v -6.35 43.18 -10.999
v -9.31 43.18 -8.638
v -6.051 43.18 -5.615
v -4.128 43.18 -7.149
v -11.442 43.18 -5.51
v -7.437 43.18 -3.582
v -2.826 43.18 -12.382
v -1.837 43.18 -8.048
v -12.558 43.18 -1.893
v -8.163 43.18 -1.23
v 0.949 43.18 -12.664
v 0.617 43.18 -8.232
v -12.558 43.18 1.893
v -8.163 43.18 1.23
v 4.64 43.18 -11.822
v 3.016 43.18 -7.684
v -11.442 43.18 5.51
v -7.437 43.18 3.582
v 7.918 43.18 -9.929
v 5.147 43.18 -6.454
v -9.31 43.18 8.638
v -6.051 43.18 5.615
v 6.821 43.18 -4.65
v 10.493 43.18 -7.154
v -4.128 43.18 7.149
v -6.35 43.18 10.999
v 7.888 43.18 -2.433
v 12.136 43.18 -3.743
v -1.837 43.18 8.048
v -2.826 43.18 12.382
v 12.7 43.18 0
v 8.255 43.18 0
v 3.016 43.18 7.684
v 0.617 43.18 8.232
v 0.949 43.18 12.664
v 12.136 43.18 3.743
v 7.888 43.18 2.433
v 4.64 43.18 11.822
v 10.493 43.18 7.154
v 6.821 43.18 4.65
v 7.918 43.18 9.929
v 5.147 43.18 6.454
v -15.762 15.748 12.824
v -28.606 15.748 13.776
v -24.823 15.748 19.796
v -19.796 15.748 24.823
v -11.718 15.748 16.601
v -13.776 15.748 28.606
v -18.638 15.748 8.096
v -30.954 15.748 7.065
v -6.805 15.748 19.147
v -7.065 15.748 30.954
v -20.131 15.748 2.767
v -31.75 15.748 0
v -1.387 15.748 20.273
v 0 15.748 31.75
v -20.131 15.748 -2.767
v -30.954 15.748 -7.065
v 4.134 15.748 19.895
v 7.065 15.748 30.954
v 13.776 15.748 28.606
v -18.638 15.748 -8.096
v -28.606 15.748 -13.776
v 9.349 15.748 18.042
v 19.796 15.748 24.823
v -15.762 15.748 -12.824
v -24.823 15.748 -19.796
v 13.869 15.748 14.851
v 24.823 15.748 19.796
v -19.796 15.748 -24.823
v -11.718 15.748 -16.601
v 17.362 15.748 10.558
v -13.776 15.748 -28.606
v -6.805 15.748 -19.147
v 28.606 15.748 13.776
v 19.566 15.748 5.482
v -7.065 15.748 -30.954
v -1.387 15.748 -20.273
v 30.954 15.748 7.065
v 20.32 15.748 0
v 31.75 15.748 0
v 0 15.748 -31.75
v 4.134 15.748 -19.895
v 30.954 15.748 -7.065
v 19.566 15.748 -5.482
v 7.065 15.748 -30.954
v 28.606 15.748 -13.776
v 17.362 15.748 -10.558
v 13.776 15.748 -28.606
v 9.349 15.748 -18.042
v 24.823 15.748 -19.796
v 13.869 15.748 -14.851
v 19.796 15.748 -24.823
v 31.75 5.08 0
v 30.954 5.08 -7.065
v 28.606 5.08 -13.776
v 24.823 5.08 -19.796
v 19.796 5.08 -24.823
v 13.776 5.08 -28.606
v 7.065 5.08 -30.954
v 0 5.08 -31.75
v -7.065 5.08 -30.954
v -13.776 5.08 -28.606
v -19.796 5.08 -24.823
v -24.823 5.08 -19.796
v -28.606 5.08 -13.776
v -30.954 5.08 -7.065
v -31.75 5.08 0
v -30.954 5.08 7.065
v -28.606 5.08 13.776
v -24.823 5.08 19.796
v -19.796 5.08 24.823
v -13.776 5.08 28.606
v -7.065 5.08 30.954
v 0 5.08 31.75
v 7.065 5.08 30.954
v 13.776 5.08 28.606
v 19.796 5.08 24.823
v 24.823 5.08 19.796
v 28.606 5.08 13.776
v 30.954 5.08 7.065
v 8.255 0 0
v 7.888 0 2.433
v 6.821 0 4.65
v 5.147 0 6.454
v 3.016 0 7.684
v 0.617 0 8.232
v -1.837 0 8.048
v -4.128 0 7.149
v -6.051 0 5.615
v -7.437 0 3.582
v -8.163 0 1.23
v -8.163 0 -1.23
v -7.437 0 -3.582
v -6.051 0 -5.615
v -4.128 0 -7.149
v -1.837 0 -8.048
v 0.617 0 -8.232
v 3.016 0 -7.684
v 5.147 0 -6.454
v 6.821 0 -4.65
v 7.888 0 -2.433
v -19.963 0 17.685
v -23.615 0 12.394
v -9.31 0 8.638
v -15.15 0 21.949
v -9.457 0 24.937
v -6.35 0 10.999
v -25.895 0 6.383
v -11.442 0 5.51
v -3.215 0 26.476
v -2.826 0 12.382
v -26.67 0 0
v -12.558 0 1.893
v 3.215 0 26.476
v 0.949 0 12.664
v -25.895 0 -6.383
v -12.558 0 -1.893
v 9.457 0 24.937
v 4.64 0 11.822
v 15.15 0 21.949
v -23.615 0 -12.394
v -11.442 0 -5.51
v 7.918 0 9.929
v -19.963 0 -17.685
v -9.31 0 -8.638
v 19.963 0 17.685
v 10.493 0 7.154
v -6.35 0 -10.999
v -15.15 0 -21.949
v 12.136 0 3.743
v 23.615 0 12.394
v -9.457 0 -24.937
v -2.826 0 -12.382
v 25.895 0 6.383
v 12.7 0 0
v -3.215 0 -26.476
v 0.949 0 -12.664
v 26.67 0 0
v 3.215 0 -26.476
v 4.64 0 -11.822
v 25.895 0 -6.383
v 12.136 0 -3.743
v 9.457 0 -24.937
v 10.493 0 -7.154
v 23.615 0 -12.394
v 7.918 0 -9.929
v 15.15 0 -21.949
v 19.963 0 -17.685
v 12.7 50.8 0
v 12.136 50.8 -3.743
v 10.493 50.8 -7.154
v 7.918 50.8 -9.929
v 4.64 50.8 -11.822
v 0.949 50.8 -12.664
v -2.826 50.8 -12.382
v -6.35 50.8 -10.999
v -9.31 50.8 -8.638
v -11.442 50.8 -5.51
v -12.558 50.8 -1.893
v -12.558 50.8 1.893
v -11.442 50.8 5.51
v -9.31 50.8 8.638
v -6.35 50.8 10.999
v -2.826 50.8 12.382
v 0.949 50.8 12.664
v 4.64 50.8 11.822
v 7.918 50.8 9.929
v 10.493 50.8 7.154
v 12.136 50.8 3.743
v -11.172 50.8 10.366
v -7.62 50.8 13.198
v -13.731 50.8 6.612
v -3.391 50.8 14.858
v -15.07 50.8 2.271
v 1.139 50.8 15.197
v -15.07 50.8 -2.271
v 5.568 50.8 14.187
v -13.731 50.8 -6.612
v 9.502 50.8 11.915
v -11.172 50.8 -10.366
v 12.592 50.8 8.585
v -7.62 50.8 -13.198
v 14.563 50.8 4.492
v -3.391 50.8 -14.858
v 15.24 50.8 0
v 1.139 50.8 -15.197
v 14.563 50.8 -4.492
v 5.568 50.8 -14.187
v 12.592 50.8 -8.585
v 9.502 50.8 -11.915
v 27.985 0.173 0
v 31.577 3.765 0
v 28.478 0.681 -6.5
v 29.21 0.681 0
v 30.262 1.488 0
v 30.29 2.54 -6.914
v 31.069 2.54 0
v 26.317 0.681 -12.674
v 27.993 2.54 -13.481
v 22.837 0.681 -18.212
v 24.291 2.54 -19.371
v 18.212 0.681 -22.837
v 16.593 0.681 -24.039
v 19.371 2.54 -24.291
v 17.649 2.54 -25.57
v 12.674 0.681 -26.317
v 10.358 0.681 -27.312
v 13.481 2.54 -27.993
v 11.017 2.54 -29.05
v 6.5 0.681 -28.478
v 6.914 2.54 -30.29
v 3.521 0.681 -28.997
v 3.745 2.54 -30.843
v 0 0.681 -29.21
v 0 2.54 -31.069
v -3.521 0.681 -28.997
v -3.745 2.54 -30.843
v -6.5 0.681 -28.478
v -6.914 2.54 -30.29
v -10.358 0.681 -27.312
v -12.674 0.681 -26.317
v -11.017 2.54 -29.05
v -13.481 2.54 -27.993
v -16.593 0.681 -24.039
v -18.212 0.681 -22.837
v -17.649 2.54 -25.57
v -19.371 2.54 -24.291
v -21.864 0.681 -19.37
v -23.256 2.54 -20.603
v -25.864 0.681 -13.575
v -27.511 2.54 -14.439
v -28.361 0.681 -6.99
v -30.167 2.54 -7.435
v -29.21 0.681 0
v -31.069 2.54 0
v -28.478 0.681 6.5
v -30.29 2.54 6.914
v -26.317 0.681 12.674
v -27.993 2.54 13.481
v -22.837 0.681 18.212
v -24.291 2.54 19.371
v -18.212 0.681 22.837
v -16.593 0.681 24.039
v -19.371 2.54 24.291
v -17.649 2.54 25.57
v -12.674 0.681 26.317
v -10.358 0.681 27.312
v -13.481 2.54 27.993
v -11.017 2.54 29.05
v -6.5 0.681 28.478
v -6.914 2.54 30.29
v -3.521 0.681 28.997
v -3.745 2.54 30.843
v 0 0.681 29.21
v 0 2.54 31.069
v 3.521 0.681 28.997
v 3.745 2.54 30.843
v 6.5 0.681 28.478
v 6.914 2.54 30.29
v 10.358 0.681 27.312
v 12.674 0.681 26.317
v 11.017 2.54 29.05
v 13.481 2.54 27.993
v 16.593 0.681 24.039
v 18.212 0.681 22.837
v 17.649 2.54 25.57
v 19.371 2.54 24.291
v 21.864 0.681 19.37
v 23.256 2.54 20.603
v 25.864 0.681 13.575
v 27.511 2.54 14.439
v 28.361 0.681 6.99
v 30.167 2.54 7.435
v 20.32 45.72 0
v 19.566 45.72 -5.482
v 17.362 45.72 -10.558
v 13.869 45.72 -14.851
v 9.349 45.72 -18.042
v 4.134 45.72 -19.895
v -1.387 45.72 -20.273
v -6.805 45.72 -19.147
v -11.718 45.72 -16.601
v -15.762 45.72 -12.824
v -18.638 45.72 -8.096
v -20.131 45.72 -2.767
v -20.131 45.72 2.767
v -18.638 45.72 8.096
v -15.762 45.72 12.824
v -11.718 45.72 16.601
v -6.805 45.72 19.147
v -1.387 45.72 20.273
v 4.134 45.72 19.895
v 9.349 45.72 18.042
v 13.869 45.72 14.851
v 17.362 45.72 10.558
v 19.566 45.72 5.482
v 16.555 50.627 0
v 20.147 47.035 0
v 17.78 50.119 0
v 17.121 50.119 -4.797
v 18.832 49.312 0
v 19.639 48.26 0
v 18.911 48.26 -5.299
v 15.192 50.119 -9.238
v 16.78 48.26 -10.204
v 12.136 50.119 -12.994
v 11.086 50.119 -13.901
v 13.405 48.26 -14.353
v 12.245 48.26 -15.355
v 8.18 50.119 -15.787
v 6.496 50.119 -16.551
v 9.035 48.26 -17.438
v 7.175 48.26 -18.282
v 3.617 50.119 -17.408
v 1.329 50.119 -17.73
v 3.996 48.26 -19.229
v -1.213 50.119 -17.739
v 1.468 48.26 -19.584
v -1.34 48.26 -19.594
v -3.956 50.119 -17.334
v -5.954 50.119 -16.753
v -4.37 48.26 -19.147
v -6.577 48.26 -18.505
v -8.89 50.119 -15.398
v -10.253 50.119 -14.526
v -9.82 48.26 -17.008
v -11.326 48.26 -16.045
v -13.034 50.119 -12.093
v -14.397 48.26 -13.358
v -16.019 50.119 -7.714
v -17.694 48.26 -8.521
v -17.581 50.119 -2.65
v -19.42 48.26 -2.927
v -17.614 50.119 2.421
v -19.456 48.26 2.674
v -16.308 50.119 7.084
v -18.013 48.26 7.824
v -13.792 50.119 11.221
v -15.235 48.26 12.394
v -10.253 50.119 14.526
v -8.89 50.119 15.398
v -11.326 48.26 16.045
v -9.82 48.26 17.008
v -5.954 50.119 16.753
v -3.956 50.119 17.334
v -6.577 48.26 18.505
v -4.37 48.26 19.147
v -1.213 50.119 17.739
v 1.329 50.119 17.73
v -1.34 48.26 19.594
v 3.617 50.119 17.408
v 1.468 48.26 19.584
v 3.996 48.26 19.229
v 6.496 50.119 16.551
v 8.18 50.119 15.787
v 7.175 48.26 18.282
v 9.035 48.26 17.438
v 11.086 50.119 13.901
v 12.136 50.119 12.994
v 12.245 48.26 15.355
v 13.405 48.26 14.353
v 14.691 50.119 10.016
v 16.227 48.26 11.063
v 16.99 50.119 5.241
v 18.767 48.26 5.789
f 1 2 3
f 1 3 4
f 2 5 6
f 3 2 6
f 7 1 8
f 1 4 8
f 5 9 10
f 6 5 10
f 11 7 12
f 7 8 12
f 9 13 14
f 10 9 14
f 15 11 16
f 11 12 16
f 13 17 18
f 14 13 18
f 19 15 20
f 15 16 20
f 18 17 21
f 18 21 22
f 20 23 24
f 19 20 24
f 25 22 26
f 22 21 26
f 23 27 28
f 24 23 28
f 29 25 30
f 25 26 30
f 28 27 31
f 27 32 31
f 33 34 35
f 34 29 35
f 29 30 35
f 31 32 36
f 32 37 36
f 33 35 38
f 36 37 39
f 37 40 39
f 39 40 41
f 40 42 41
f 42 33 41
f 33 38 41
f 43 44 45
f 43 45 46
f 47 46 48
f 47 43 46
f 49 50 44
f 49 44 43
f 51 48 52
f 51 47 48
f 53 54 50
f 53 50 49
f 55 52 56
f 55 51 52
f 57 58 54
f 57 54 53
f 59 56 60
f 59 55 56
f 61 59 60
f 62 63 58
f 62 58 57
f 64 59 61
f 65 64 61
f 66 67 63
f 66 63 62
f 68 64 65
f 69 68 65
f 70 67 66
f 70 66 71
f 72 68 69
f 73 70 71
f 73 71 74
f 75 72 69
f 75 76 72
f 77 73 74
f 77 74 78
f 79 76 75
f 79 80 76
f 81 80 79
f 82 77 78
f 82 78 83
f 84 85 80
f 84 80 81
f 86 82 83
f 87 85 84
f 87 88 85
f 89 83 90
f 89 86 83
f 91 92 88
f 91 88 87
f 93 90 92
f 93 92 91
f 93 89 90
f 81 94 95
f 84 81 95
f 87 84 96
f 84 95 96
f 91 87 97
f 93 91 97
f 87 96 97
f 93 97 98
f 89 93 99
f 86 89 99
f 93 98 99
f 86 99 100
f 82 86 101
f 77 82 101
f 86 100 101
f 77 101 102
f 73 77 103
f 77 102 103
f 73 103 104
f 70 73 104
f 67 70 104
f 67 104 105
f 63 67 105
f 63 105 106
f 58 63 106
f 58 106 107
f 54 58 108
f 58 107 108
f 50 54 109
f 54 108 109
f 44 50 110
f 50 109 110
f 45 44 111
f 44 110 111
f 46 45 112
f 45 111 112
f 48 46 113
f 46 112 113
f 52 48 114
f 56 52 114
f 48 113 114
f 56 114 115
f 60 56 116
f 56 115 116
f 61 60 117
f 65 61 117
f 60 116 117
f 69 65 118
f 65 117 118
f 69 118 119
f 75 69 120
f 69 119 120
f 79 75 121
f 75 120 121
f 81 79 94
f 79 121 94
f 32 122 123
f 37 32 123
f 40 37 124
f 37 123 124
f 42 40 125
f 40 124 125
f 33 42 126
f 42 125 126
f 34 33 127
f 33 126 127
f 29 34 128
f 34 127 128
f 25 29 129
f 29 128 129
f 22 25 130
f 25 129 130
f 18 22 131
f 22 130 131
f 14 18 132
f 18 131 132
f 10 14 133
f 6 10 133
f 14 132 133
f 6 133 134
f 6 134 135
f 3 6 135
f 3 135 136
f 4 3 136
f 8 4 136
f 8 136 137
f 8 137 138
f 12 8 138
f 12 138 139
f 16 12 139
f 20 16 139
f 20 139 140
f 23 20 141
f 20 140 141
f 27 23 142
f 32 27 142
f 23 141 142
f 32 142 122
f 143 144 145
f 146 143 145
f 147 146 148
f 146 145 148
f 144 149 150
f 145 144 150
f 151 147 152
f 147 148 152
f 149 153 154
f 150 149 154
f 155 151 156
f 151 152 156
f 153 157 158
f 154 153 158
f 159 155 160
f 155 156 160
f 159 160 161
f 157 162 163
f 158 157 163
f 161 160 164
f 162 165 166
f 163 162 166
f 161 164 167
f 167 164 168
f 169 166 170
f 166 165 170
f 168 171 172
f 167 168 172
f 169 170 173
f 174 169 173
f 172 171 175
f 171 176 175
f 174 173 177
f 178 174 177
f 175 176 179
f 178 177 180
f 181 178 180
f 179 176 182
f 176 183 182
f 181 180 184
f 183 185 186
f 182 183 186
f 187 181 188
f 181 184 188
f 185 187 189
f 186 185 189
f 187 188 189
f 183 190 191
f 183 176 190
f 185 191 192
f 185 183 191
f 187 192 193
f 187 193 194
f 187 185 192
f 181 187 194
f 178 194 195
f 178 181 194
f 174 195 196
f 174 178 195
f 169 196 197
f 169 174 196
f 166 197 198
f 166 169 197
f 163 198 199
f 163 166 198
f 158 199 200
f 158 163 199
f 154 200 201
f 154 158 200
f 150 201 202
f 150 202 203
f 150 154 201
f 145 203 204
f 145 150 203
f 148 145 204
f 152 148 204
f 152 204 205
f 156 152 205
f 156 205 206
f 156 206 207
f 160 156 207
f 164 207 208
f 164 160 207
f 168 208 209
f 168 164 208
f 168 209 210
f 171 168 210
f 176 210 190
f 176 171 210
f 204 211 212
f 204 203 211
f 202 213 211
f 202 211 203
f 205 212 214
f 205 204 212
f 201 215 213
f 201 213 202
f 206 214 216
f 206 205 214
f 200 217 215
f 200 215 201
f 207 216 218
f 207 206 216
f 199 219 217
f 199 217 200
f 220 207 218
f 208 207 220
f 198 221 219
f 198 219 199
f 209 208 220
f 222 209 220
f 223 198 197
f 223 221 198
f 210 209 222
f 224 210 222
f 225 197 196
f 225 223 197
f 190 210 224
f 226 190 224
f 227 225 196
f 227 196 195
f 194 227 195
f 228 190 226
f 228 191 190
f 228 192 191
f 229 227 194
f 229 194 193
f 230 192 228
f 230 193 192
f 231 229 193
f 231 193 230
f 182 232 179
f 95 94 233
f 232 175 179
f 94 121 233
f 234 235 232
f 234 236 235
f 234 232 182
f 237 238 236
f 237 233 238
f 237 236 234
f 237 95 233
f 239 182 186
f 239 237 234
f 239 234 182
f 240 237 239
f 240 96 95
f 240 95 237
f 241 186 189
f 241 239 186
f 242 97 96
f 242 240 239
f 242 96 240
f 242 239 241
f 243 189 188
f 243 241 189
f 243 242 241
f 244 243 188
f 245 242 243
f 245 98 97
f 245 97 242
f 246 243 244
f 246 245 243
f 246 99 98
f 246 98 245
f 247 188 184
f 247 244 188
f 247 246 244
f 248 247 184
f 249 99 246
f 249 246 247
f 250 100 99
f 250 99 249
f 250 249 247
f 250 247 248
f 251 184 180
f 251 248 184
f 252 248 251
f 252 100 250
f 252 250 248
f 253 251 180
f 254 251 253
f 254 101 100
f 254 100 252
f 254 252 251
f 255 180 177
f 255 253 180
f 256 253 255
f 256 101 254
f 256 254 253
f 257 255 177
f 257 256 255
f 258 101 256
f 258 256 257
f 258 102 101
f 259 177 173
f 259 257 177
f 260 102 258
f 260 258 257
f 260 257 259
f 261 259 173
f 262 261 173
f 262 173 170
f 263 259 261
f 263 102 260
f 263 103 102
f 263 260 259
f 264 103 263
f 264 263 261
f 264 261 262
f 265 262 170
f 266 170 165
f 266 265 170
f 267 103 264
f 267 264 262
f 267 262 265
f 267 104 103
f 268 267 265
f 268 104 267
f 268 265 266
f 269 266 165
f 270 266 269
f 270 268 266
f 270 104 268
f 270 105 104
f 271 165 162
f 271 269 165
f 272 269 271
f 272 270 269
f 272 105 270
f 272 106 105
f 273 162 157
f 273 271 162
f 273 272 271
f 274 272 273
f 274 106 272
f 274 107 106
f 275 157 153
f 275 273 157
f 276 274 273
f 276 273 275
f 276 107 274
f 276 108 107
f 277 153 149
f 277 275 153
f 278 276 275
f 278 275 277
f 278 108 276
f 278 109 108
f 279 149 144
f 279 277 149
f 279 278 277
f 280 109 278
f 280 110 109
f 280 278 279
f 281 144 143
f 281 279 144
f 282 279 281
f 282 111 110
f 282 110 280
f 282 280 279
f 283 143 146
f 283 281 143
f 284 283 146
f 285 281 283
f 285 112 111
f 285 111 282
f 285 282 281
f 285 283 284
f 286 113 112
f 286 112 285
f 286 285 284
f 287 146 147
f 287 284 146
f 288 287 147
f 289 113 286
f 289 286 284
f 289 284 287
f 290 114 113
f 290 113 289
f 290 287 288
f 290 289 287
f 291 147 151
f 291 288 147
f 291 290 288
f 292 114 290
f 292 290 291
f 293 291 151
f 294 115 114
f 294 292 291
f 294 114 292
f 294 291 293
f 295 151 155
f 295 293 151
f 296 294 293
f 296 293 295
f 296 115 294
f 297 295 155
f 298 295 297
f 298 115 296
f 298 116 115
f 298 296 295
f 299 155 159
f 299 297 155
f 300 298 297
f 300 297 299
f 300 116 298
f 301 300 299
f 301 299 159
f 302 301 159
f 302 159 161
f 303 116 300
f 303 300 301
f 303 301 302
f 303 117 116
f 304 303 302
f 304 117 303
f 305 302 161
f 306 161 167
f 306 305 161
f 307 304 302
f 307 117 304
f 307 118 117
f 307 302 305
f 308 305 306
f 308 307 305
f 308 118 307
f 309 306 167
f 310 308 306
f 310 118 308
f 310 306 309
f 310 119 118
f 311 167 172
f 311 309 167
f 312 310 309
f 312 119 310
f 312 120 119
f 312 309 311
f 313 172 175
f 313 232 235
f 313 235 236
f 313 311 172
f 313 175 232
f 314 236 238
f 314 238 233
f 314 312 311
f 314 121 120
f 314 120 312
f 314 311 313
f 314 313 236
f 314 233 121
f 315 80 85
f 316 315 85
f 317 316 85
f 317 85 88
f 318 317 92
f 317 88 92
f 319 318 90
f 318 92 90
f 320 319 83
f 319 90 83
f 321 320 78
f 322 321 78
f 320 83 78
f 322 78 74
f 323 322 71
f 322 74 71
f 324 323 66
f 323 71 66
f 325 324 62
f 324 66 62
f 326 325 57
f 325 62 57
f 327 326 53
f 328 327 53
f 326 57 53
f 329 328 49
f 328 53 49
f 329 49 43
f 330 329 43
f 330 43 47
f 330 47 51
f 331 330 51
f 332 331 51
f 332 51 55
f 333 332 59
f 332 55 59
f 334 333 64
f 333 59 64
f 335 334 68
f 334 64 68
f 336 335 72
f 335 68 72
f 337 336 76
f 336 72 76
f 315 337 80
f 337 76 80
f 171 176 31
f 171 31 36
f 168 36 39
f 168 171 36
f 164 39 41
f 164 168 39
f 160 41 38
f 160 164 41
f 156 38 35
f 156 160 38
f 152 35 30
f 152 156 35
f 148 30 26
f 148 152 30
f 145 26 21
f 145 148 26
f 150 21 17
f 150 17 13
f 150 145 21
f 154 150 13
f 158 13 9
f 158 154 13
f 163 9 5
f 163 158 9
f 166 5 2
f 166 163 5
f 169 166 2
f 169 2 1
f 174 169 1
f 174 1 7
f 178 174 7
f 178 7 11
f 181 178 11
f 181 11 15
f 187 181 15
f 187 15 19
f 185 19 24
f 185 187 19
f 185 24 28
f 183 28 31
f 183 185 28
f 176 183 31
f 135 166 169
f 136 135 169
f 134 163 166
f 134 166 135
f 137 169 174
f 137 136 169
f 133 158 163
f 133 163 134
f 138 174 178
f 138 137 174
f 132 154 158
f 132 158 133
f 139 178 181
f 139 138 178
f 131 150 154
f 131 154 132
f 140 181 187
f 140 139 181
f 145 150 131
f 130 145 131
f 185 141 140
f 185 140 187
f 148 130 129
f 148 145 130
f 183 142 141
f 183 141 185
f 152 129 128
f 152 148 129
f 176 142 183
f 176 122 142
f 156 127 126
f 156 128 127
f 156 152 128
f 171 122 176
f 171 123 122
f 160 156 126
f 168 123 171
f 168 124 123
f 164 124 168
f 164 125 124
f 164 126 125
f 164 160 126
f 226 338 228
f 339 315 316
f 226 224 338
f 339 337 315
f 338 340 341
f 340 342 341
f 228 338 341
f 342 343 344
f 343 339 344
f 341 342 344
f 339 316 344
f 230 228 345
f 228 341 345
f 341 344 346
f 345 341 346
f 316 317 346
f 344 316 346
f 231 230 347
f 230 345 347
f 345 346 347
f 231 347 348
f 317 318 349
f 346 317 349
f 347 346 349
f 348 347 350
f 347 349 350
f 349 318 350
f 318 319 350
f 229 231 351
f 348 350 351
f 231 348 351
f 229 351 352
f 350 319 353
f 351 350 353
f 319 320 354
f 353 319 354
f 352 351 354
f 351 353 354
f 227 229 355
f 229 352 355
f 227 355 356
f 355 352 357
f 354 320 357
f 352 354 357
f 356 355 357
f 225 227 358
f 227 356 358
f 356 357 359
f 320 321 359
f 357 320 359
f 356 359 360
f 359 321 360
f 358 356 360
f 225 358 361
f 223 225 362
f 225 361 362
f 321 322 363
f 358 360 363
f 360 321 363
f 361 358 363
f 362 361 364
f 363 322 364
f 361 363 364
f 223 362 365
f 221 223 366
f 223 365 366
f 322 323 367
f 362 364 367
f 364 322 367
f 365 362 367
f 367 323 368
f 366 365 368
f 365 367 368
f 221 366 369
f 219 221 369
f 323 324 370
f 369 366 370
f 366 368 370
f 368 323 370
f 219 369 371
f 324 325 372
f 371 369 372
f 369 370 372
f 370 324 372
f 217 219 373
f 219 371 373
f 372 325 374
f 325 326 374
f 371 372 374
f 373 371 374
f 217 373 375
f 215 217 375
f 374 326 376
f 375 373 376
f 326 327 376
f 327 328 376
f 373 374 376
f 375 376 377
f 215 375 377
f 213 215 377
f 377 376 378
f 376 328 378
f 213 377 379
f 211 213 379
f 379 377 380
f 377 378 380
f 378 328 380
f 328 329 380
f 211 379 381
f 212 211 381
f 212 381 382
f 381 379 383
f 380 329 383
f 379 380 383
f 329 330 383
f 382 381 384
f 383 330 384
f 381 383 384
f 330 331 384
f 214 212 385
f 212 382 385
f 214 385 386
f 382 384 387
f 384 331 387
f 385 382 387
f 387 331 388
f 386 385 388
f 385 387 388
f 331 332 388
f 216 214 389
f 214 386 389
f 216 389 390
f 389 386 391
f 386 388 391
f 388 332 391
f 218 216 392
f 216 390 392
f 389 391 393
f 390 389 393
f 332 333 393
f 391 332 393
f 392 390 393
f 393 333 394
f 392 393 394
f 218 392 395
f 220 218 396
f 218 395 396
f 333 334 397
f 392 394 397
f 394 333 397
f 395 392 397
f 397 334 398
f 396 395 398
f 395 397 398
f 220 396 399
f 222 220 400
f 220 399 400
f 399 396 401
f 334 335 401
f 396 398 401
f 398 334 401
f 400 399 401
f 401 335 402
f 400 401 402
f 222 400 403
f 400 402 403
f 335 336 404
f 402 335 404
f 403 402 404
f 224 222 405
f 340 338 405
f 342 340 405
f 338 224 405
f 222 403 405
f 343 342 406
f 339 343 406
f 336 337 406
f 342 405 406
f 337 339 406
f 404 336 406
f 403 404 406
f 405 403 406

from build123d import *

# Parameters (mm, degrees)
SKETCH1_R           = 31.75
SKETCH1_R_2         = 12.7
BOSS_EXTRUDE1_DEPTH = 15.748
SKETCH2_R           = 20.32
SKETCH2_R_2         = 12.7
BOSS_EXTRUDE2_DEPTH = 35.052
SKETCH3_R           = 12.7
SKETCH3_R_2         = 8.255
BOSS_EXTRUDE3_DEPTH = 43.18
FILLET1_R           = 5.08
FILLET2_R           = 5.08


with BuildPart() as part:
    # Sketch1 → Boss-Extrude1 (new body)
    with BuildSketch(Plane(origin=(0, 0, 0), x_dir=(1, 0, 0), z_dir=(0, 1, 0))):
        Circle(SKETCH1_R)
        Circle(SKETCH1_R_2, mode=Mode.SUBTRACT)
    extrude(amount=BOSS_EXTRUDE1_DEPTH)

    # Sketch2 → Boss-Extrude2 (add)
    with BuildSketch(Plane(origin=(0, 15.748, 0), x_dir=(1, 0, 0), z_dir=(0, 1, 0))):
        Circle(SKETCH2_R)
        Circle(SKETCH2_R_2, mode=Mode.SUBTRACT)
    extrude(amount=BOSS_EXTRUDE2_DEPTH)

    # Fillet1
    fillet1_edges = [part.edges().sort_by_distance(p)[0] for p in [
        (-31.75, 0, 0),
    ]]
    fillet(fillet1_edges, radius=FILLET1_R)

    # Fillet2
    fillet2_edges = [part.edges().sort_by_distance(p)[0] for p in [
        (-20.32, 50.8, 0),
    ]]
    fillet(fillet2_edges, radius=FILLET2_R)


with BuildPart() as body_2:
    # Sketch3 → Boss-Extrude3 (new body)
    with BuildSketch(Plane.XZ):
        Circle(SKETCH3_R)
        Circle(SKETCH3_R_2, mode=Mode.SUBTRACT)
    extrude(amount=-BOSS_EXTRUDE3_DEPTH)


solid = Compound([part.part, body_2.part])
